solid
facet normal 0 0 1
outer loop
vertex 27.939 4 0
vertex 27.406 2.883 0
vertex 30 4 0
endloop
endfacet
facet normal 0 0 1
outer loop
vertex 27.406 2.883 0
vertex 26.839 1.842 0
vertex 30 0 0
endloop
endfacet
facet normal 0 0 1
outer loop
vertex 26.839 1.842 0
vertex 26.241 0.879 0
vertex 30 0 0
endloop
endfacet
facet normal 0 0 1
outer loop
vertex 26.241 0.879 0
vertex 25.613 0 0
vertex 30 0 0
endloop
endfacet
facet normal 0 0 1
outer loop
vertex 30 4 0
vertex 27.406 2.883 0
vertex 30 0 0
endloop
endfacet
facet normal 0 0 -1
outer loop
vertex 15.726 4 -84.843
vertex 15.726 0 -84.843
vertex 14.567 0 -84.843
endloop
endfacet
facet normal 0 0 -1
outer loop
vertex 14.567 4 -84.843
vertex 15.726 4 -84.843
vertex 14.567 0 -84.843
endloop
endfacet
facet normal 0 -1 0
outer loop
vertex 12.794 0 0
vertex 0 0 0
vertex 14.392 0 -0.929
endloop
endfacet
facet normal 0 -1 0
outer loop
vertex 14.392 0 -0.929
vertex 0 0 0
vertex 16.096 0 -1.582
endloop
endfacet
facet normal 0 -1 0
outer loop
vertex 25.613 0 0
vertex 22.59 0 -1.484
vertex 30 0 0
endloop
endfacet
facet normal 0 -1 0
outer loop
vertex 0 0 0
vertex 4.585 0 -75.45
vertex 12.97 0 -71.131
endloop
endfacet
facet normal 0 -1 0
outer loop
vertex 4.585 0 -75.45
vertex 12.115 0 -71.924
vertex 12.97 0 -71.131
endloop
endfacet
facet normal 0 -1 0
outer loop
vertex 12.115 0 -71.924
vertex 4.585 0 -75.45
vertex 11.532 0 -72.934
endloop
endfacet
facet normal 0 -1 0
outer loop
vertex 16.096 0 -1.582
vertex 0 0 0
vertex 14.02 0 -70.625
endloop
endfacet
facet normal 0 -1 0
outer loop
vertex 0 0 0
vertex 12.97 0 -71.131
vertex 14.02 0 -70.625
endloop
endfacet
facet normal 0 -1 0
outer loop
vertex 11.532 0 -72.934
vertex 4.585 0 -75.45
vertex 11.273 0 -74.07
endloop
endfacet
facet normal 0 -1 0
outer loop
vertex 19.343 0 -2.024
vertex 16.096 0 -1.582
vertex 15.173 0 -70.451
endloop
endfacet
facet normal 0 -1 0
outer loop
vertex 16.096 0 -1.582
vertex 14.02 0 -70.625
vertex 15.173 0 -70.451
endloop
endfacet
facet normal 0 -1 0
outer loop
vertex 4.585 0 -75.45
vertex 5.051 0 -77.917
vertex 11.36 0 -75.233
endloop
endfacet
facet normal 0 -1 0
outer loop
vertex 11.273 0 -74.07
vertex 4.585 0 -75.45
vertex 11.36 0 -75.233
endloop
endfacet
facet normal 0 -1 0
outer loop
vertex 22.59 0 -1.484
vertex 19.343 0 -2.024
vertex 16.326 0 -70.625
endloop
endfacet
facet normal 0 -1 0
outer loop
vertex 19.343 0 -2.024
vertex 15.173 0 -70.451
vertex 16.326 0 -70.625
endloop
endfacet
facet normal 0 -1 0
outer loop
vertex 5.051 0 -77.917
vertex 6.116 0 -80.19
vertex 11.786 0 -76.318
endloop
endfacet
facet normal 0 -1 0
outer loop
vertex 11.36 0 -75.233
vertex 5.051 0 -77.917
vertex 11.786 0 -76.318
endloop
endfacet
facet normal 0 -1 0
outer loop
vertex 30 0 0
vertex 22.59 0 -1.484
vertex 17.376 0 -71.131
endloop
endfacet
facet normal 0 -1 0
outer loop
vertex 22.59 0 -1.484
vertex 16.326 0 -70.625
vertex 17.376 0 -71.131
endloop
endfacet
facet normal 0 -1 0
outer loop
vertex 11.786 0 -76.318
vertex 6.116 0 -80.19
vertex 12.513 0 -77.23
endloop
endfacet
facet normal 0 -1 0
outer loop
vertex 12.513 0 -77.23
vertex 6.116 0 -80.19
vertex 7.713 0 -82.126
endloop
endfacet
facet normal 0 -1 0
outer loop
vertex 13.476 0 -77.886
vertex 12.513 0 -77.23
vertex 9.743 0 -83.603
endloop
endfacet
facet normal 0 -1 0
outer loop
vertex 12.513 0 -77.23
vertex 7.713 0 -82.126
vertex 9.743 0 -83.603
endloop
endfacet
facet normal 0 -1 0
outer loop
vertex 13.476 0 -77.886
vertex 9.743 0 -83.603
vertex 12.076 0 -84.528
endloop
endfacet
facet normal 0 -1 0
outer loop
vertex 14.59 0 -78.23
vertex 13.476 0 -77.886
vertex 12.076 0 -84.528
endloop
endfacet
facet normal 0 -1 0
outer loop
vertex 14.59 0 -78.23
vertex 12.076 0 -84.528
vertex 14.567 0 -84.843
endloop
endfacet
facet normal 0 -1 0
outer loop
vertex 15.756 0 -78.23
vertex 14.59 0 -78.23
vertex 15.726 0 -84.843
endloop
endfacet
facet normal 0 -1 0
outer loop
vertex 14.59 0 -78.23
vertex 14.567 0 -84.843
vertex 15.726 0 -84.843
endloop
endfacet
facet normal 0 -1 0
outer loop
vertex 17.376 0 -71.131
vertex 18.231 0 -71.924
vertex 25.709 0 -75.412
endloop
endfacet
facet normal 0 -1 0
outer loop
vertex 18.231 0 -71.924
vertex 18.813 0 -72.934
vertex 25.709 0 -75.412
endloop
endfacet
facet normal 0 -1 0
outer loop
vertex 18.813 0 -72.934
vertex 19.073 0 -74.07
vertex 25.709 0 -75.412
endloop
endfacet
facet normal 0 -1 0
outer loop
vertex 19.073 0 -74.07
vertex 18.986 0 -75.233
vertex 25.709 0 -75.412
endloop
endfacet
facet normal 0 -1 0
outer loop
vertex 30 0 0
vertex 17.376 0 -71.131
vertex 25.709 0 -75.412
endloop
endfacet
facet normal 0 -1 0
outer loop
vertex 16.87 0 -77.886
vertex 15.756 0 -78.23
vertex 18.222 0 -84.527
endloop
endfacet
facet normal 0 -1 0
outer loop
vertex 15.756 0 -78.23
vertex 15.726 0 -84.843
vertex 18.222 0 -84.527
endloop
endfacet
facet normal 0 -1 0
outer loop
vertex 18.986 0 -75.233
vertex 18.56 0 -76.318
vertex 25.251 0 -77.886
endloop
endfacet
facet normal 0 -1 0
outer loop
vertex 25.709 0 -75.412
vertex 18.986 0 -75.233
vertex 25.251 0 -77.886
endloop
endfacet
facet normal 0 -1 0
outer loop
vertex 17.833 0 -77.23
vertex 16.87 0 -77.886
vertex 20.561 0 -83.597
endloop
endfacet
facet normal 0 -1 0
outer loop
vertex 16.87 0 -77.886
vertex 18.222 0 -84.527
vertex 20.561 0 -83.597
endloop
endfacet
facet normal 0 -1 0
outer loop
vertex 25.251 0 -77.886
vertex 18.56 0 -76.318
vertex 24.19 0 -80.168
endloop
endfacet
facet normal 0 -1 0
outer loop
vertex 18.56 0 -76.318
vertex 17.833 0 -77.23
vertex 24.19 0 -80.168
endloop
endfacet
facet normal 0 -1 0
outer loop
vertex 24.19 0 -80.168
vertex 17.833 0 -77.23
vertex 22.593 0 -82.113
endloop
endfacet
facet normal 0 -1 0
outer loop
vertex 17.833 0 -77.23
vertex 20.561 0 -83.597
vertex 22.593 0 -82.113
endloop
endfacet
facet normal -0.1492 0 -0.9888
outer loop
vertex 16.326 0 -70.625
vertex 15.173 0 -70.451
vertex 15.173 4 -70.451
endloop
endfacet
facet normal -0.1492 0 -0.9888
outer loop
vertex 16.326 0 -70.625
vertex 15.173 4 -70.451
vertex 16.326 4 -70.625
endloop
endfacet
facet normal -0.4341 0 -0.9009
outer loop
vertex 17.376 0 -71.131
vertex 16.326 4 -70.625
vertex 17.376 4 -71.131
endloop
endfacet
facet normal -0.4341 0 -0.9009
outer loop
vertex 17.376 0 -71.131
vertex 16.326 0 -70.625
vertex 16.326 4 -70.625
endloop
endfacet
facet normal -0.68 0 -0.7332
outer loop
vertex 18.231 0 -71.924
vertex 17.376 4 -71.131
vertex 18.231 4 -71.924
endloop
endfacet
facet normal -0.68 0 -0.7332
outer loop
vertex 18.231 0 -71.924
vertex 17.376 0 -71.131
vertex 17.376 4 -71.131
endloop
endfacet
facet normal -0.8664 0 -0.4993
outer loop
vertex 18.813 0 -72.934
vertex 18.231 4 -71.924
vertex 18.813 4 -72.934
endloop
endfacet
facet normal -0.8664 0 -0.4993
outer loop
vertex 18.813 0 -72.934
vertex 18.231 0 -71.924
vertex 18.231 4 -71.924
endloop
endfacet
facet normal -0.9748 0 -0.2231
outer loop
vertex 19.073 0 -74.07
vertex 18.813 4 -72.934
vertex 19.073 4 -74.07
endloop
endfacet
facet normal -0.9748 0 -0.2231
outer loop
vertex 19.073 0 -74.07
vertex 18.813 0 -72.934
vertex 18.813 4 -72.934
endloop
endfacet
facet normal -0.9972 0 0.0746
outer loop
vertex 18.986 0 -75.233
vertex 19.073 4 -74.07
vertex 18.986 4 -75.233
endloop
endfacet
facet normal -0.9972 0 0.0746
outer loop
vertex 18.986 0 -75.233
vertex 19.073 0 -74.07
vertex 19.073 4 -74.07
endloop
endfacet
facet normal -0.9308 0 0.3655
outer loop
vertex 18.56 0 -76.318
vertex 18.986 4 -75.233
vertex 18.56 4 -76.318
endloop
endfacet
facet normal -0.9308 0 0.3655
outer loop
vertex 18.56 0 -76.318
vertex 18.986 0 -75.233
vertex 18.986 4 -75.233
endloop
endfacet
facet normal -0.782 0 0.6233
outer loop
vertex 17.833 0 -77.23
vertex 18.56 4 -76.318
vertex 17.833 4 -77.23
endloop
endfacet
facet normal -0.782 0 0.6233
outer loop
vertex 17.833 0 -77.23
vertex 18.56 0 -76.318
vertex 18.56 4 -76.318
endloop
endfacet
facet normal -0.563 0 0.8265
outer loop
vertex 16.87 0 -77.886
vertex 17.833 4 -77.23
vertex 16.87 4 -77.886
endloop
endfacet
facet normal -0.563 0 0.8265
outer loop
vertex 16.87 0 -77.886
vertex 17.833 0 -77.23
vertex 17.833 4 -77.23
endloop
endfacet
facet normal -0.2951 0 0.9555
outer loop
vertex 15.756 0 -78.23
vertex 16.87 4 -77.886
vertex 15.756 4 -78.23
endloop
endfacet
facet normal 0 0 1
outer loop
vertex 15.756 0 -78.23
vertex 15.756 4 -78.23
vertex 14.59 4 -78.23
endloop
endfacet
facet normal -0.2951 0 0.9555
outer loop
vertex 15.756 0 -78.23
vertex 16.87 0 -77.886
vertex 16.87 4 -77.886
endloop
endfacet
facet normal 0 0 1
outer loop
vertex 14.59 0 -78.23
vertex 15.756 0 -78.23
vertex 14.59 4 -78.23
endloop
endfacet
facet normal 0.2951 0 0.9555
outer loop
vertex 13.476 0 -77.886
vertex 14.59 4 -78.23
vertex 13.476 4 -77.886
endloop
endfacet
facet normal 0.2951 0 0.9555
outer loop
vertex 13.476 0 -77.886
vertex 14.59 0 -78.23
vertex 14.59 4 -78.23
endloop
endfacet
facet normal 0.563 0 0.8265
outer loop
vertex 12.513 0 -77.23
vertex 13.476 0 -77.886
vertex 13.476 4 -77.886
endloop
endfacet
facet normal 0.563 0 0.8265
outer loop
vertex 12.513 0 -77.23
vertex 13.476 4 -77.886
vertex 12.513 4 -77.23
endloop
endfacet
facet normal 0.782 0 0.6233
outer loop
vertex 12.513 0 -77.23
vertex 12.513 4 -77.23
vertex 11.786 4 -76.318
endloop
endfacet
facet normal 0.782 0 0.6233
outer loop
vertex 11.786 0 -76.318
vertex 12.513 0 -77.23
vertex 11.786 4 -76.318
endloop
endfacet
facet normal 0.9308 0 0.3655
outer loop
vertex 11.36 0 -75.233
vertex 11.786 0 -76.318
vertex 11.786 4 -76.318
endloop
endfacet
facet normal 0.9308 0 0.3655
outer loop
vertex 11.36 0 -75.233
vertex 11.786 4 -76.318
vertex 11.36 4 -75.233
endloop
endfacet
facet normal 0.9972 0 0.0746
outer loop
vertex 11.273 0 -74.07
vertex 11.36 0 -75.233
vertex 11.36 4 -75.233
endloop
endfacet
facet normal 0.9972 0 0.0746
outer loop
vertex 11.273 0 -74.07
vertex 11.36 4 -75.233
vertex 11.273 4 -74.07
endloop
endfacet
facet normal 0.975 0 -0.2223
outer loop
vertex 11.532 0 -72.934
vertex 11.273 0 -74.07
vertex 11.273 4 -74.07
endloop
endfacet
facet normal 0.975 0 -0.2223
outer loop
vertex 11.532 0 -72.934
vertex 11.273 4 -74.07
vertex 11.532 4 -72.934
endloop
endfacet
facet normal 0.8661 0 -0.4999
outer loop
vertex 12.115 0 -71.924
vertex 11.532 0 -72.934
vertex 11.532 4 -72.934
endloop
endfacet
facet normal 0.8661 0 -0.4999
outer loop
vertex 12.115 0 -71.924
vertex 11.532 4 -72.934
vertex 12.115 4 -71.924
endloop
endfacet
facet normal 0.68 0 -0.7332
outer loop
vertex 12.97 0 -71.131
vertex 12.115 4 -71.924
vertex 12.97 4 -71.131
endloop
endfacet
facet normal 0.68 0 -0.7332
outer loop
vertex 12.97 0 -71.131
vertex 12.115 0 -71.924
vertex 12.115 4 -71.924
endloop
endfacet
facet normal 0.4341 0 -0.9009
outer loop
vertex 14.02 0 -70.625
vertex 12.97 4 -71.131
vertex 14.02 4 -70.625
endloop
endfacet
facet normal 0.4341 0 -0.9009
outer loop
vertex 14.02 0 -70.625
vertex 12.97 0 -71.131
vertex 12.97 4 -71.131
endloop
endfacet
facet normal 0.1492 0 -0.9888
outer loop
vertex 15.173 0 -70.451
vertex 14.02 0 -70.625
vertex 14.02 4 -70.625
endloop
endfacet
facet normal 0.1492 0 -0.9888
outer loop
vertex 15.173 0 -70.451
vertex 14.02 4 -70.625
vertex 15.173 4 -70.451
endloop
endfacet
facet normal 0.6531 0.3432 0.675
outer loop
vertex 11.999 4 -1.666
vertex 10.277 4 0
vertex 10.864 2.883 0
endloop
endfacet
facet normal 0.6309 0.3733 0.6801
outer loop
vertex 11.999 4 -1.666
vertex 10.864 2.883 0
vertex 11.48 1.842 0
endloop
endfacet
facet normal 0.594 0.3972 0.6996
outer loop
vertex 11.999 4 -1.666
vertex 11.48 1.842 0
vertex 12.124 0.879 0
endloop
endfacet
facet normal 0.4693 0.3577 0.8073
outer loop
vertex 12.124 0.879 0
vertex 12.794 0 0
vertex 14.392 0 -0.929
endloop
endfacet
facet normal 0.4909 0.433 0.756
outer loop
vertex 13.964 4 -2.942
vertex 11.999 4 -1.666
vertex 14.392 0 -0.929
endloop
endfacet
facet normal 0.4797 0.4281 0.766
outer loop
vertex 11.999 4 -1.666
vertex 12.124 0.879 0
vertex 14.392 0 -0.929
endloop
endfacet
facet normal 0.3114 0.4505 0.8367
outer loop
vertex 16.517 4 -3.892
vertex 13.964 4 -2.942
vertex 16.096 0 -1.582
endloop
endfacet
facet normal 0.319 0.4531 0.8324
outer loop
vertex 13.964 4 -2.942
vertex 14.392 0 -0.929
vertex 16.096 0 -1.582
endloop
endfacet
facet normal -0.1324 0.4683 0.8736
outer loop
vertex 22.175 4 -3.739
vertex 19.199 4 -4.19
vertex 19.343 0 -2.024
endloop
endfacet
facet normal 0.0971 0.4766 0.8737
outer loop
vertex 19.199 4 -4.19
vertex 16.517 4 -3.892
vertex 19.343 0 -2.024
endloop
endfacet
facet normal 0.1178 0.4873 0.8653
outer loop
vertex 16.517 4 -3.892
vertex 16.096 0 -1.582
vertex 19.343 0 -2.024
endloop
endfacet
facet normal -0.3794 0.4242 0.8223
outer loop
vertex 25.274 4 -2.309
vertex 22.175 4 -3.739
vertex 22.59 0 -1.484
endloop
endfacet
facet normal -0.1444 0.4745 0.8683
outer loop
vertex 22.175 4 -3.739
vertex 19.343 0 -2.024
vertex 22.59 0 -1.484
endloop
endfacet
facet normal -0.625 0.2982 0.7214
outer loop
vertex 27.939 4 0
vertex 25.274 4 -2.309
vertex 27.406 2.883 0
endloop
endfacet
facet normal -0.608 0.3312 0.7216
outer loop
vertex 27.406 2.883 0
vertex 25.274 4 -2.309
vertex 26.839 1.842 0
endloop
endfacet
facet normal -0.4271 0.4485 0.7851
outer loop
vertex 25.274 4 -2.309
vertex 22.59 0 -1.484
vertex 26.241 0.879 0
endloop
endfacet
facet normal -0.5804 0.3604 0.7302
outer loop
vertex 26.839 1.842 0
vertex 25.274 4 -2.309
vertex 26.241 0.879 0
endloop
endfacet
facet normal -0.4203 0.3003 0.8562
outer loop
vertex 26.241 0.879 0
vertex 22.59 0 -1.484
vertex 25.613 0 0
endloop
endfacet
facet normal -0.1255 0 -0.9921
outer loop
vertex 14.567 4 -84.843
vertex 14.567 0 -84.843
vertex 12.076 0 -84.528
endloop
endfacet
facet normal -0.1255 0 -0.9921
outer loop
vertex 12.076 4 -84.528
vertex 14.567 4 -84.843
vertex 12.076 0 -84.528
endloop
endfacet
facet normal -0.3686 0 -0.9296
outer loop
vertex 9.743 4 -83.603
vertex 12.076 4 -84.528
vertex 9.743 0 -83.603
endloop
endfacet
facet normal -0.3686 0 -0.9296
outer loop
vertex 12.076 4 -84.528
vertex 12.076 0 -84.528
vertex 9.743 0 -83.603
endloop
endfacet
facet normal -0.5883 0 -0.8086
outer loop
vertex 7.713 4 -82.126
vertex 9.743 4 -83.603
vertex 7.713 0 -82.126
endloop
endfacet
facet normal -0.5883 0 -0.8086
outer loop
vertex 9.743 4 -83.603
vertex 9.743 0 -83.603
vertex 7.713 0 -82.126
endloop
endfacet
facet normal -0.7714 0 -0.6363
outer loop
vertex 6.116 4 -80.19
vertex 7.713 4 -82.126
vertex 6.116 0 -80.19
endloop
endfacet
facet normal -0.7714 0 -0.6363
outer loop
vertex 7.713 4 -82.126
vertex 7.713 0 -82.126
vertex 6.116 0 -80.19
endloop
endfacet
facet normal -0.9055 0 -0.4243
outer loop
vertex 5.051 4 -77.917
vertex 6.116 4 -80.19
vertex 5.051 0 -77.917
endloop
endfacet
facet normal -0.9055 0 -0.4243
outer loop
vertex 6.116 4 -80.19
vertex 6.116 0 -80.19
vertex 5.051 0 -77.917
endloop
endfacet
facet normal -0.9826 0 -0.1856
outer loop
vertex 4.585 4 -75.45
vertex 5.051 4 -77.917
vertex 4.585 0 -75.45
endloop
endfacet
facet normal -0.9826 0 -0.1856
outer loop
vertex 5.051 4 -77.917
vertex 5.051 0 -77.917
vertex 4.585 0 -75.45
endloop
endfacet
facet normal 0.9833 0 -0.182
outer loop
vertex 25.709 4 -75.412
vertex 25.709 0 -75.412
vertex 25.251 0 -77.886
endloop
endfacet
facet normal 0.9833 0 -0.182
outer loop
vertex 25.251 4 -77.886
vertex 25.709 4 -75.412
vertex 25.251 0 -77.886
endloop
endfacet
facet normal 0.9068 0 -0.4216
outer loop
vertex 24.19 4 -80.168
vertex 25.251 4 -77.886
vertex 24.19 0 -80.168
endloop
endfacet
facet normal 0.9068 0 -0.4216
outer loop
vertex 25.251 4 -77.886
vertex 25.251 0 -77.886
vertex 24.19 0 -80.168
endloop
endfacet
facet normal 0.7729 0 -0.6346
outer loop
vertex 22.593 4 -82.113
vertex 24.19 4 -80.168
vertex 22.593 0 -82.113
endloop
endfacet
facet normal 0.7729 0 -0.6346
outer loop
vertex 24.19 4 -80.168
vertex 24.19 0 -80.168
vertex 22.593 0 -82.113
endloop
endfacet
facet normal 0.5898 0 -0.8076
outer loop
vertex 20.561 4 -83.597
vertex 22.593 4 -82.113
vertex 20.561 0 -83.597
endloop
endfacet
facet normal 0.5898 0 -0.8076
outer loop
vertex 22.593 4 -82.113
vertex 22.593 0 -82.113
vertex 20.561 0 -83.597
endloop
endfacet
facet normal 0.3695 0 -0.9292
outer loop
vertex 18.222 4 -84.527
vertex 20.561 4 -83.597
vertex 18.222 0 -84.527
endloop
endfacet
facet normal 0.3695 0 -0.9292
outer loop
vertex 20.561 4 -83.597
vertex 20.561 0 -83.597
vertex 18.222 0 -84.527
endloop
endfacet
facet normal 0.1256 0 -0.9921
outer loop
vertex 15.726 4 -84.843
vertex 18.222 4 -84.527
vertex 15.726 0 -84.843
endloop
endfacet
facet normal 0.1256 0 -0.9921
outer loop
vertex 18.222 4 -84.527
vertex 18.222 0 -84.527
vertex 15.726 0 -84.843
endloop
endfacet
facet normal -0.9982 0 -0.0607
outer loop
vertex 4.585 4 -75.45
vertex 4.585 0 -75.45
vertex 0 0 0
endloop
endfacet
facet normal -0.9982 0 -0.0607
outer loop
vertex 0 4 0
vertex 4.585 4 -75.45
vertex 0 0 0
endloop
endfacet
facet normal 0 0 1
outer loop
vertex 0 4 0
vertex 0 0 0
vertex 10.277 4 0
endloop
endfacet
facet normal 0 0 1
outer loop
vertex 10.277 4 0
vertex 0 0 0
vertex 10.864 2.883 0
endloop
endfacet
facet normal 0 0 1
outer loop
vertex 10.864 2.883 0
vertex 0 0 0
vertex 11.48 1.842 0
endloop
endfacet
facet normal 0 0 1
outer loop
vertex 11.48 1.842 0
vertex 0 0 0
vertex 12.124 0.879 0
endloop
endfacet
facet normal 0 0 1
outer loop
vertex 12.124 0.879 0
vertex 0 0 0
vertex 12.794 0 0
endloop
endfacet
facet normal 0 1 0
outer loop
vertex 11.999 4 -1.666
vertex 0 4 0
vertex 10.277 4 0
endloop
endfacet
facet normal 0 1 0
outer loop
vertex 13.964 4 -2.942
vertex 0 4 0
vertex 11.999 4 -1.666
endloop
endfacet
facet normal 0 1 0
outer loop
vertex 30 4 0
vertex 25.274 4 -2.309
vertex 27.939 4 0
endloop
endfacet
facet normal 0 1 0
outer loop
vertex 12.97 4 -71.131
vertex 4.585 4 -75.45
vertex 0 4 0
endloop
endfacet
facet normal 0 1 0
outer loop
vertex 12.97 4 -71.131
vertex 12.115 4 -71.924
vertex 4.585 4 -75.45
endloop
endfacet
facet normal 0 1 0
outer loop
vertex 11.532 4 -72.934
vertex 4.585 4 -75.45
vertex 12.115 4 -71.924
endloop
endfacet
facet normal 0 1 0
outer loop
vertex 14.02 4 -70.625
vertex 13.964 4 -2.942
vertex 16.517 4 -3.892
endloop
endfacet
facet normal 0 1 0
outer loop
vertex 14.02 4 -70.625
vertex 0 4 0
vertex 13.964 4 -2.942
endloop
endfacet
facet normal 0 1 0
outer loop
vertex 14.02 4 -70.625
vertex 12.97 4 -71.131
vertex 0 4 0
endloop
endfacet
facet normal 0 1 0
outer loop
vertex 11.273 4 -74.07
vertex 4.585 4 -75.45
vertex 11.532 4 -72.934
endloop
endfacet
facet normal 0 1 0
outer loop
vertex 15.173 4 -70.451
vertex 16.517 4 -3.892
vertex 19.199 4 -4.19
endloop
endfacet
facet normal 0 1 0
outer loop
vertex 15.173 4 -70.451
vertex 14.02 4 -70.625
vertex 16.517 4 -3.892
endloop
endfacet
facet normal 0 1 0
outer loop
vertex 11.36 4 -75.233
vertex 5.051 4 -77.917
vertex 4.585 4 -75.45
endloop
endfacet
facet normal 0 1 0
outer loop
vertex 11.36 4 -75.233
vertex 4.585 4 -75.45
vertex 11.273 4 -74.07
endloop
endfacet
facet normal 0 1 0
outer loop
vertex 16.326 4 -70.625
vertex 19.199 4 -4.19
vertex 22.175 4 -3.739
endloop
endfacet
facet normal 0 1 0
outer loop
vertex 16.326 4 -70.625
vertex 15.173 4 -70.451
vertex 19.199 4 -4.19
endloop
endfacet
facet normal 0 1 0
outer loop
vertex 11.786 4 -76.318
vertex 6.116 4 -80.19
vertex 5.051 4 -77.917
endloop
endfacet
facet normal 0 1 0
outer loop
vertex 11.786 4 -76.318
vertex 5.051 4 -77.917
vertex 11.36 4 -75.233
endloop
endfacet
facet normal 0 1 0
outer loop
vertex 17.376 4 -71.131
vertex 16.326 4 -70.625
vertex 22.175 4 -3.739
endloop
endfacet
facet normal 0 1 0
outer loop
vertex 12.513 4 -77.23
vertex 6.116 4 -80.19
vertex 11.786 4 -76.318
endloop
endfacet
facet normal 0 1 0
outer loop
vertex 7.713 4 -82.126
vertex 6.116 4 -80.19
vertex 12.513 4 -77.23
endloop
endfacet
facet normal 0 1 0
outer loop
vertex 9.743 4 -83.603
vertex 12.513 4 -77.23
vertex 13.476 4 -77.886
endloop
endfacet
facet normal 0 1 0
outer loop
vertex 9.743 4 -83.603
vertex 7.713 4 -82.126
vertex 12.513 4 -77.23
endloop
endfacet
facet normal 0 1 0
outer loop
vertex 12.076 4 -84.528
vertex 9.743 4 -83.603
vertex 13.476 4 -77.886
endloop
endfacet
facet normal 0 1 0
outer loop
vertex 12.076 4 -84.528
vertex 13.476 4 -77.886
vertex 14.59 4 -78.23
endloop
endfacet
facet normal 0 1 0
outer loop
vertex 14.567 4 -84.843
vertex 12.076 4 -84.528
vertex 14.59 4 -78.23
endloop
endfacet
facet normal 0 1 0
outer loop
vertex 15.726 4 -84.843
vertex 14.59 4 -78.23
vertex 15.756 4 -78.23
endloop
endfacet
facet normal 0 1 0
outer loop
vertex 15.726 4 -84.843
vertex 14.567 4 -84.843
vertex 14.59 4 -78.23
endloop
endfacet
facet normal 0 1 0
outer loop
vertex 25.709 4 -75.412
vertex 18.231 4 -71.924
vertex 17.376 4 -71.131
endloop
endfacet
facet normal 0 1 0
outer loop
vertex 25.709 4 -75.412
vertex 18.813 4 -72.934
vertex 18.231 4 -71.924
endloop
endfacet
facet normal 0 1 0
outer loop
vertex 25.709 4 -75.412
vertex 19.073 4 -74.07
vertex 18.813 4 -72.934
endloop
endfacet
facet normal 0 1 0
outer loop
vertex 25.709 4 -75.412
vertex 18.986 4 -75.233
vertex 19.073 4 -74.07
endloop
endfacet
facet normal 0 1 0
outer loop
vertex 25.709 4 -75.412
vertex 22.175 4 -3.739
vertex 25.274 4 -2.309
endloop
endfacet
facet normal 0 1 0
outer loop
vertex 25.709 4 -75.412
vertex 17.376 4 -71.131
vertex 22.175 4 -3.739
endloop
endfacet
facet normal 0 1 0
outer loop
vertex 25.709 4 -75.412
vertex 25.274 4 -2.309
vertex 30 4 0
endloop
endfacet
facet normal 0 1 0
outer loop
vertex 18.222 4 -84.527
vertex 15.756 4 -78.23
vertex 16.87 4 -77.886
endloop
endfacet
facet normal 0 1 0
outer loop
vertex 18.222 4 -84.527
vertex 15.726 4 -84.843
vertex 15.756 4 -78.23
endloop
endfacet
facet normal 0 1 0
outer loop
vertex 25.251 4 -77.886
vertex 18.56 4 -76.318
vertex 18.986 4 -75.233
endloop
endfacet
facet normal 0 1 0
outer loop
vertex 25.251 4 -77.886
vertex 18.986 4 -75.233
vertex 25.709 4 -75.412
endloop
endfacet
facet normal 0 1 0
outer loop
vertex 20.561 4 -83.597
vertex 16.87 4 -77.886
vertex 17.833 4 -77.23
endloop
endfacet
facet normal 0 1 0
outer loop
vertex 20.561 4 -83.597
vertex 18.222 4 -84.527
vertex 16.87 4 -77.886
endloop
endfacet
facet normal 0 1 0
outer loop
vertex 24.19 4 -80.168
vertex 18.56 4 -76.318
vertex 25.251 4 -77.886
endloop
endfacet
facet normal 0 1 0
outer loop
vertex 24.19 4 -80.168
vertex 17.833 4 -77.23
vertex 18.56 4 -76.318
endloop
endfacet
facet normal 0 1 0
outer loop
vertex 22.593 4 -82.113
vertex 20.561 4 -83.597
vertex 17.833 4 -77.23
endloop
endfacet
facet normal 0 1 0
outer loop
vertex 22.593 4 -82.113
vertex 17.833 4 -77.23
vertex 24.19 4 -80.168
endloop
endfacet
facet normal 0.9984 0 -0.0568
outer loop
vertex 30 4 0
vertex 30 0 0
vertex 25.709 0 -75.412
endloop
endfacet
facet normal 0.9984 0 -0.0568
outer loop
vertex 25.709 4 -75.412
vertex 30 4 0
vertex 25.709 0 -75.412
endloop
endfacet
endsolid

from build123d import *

# Parameters (mm, degrees)
SKETCH1_R           = 3.911052803
BOSS_EXTRUDE1_DEPTH = 4
CAVITY1_OUTLINE_W   = 12.415
CAVITY1_OUTLINE_H   = 5.700748897


# Read off the part's stored shape, not the designer's step: Cavity1
with BuildPart() as part:
    # Sketch1 → Boss-Extrude1 (new body)
    with BuildSketch(Plane(origin=(0, 0, 0), x_dir=(1, 0, 0), z_dir=(0, 1, 0))):
        with BuildLine():
            Line((0, 0), (30, 0))
            Line((30, 0), (25.709430043, 75.411524479))
            ThreePointArc((25.709430043, 75.411524479), (22.592877256, 82.112613927), (15.725576294, 84.84348898))
            Line((15.725576294, 84.84348898), (15.172794511, 84.84348898))
            Line((15.172794511, 84.84348898), (14.566572295, 84.84348898))
            ThreePointArc((14.566572295, 84.84348898), (7.713312448, 82.125853257), (4.584985356, 75.450054873))
            Line((4.584985356, 75.450054873), (0, 0))
        make_face()
        with Locations(Location((15.172794511, 74.362549593, 0), (0, 0, 270))):
            Circle(SKETCH1_R, mode=Mode.SUBTRACT)
    extrude(amount=BOSS_EXTRUDE1_DEPTH)

    # Cavity1 outline → Cavity1 (revolve, cut)
    with BuildSketch(Plane(origin=(19.189357323, 5.518997389, 9.104198025), x_dir=(0.9996334354377989, 0.02380958372693479, -0.012887919831146358), z_dir=(0, -0.47602788353146924, -0.8794301871669804))):
        with Locations((6.2075, -2.156922497)):
            Rectangle(CAVITY1_OUTLINE_W, CAVITY1_OUTLINE_H)
    revolve(axis=Axis((19.189357323, 5.518997389, 9.104198025), (0.027073875873690006, -0.8791078192254351, 0.47585338857874704)), mode=Mode.SUBTRACT)


solid = part.part
